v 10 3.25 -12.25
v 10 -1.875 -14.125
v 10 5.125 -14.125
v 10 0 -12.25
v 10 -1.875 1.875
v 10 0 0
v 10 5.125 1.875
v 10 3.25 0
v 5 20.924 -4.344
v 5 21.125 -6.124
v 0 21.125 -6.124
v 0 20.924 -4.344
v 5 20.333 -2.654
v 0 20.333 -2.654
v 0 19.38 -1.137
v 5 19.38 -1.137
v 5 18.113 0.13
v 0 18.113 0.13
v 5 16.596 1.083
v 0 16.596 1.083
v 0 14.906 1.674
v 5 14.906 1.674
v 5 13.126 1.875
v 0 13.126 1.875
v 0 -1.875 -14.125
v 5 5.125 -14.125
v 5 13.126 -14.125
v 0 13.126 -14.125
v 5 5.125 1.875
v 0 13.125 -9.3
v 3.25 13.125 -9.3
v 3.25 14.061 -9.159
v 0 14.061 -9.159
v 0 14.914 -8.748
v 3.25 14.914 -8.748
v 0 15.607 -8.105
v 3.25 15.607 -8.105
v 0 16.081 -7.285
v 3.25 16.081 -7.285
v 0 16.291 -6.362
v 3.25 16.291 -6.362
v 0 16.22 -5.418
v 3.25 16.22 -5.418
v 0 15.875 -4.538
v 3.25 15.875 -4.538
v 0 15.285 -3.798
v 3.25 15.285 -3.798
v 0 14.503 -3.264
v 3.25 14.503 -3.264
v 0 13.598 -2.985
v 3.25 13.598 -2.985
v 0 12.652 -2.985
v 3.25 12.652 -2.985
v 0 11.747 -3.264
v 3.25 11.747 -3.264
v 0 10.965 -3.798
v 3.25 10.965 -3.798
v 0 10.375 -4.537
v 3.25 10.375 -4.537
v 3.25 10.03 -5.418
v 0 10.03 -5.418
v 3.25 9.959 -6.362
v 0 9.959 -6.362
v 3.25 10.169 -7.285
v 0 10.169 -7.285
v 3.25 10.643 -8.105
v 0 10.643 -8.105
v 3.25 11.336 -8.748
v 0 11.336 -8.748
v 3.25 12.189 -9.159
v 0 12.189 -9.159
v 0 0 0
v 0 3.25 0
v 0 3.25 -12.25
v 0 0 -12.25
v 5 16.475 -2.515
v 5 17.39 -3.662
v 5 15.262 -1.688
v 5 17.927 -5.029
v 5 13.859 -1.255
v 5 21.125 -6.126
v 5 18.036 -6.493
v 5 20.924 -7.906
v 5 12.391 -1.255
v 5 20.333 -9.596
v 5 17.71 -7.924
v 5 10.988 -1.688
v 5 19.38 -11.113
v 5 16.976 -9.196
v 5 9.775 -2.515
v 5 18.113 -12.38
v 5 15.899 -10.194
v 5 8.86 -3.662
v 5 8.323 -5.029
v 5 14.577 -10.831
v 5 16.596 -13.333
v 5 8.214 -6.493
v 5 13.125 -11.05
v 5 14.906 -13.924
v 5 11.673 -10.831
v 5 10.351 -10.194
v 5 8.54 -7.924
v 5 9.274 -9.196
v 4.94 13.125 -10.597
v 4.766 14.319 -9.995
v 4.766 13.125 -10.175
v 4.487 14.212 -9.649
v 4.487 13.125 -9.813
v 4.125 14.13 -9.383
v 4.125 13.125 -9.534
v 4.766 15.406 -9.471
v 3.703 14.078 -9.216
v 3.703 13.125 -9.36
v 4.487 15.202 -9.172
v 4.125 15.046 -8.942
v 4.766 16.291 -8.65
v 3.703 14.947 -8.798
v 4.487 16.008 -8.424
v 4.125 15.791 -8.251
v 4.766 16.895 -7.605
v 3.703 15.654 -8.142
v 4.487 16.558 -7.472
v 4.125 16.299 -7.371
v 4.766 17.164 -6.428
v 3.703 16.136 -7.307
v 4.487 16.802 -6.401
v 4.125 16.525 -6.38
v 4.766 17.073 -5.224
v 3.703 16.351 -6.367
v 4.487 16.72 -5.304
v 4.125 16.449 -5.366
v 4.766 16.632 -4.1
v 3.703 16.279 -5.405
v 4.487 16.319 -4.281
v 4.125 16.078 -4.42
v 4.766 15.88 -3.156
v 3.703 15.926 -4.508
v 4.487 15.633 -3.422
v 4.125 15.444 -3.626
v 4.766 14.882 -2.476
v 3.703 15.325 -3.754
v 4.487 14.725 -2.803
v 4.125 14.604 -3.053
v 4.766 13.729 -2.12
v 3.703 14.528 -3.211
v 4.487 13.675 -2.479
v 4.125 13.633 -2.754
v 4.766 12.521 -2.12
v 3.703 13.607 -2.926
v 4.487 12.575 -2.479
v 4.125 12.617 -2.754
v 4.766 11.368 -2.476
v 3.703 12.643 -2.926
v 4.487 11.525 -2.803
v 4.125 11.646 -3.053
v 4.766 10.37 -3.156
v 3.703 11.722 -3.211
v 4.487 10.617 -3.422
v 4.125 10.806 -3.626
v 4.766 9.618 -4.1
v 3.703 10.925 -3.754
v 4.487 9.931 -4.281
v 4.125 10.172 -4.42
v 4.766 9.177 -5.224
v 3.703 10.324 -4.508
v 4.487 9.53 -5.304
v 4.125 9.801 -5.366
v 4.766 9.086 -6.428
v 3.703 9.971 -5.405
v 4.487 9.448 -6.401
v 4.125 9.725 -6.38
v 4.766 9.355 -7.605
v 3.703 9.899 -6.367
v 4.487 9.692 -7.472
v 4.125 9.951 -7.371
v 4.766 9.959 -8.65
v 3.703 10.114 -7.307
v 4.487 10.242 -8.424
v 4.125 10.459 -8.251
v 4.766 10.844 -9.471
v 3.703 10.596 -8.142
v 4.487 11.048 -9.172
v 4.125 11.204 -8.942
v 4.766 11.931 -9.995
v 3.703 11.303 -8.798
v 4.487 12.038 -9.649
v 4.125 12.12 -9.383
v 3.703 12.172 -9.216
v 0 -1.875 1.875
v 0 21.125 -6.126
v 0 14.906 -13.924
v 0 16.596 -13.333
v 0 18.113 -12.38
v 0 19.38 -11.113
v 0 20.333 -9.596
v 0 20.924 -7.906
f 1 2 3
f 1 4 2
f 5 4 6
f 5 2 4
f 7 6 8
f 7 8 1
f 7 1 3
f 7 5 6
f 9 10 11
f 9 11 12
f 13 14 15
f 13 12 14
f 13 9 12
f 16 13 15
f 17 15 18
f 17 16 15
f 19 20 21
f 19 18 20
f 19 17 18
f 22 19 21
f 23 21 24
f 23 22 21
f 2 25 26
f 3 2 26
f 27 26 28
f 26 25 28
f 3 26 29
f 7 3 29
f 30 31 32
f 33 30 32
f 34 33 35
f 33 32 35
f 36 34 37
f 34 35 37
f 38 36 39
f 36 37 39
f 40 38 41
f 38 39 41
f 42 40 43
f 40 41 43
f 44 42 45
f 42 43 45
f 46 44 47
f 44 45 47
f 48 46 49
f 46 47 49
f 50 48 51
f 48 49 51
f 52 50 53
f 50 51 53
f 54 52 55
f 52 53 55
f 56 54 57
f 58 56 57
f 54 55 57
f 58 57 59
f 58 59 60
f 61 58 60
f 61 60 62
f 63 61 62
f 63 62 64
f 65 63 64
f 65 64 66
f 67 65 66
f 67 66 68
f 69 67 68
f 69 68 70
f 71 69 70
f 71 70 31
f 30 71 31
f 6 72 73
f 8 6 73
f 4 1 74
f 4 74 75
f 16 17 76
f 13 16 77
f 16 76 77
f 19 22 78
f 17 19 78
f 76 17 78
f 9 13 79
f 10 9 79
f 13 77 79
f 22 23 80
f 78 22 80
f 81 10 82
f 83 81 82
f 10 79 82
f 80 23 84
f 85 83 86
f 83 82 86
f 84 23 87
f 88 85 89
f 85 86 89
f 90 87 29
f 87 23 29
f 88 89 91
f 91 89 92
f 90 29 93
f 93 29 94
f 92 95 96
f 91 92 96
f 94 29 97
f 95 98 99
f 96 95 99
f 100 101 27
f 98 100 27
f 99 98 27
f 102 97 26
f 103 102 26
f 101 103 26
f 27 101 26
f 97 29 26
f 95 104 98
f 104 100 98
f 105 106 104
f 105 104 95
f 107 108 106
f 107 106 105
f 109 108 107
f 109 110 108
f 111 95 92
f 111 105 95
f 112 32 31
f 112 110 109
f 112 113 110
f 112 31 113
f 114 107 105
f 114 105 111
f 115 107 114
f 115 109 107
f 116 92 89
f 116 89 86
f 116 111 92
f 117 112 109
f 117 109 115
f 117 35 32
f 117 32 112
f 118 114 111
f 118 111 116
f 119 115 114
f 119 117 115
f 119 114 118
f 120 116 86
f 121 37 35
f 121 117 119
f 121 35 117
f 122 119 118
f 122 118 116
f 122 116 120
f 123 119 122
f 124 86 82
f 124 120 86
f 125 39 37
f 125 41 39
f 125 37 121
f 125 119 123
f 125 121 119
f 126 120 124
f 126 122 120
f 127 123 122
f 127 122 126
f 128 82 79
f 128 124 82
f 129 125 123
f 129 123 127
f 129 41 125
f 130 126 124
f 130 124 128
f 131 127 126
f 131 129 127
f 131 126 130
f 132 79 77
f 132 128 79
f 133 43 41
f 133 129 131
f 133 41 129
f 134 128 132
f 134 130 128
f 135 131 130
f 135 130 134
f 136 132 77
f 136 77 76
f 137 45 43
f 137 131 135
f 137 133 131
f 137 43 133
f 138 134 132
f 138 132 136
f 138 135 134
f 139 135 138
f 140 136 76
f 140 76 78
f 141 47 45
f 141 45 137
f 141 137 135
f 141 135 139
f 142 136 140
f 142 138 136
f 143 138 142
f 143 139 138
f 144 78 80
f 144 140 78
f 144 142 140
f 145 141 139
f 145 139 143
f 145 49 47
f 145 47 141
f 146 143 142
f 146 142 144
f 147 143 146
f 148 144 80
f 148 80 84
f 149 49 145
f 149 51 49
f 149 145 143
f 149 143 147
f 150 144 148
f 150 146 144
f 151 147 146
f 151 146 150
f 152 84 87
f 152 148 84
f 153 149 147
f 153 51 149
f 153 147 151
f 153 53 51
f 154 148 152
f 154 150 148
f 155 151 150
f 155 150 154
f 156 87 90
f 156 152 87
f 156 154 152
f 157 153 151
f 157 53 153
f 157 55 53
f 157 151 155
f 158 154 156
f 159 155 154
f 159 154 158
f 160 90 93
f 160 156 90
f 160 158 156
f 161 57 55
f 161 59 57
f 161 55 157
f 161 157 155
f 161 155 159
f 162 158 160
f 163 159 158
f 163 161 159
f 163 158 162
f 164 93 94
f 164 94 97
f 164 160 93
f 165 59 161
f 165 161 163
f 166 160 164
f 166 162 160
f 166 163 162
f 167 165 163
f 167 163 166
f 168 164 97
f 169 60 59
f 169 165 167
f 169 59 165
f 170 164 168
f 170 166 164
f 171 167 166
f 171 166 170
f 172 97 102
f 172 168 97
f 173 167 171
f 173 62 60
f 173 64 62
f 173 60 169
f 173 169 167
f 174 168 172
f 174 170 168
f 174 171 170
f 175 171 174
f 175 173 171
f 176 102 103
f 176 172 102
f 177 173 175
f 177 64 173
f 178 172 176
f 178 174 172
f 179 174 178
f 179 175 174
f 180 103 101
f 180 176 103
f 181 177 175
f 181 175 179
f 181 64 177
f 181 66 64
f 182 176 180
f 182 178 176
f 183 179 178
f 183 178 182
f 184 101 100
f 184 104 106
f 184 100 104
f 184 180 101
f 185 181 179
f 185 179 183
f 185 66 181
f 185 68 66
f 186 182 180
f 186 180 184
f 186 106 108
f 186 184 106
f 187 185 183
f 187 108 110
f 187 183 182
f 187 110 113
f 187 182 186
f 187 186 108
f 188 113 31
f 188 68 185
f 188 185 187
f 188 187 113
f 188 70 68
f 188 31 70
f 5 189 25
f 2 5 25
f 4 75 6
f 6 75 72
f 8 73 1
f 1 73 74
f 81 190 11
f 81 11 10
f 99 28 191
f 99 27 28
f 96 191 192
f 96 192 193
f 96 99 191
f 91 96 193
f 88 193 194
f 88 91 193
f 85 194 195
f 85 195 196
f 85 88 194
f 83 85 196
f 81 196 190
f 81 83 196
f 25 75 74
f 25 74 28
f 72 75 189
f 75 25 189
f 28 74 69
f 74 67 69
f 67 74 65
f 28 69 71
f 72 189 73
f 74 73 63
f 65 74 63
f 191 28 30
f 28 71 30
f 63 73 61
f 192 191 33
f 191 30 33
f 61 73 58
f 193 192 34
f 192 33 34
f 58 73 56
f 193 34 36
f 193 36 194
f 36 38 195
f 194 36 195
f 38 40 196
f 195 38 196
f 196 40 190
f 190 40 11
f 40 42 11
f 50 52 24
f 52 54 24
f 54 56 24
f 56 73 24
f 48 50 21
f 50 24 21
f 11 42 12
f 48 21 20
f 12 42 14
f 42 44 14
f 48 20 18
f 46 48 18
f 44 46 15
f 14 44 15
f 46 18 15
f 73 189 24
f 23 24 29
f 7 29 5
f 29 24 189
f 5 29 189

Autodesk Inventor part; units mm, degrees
ref_plane "YZ Plane" through (0, 0, 0) normal (1, 0, 0) x (0, 1, 0)
ref_plane "XZ Plane" through (0, 0, 0) normal (0, 1, 0) x (-1, 0, 0)
ref_plane "XY Plane" through (0, 0, 0) normal (0, 0, 1) x (1, 0, 0)
sketch "Sketch1" plane through (0, 0, 0) normal (1, 0, 0) x (0, 1, 0)
  line L0 (0, 0) -> (3.25, 0)
  line L1 (3.25, 0) -> (3.25, -12.25)
  line L2 (3.25, -12.25) -> (0, -12.25)
  line L3 (0, -12.25) -> (0, 0)
  line L4 (-1.875, -14.125) -> (5.125, -14.125)
  line L5 (5.125, -14.125) -> (5.125, 1.875)
  line L6 (5.125, 1.875) -> (-1.875, 1.875)
  line L7 (-1.875, 1.875) -> (-1.875, -14.125)
  line L8 (-1.875, -14.125) -> (5.125, 1.875) construction
  line L9 (5.125, -14.125) -> (-1.875, 1.875) construction
  point P0 (1.625, -6.125)
  dimension "d0" = 3.25
  dimension "d1" = 12.25
  dimension "d2" = 7
  dimension "d3" = 16
extrude "Extrusion1" add sketch "Sketch1" along normal blind 10
sketch "Sketch2" plane through (0, 5.125, 1.875) normal (0, 1, 0) x (1, 0, 0)
  line L0 (0, 0) -> (0, 16) projected
  line L1 (0, 16) -> (10, 16) projected
  line L2 (0, 0) -> (5, 0)
  line L3 (5, 0) -> (5, 16)
  line L4 (5, 16) -> (0, 16)
  line L5 (0, 16) -> (0, 0)
  point P0 (0, 1.875)
  dimension "d6" = 5
extrude "Extrusion2" add sketch "Sketch2" along normal blind 16
sketch "Sketch3" plane through (5, 5.125, 1.875) normal (1, 0, 0) x (0, 0, -1)
  line L0 (16, 0) -> (0, 0) construction
  line L1 (0, -7) -> (0, 16) construction
  line L2 (16, 0) -> (0, 16) construction
  circle A0 centre (8, 8) radius 3.175
  point P0 (1.875, -5.125)
  dimension "d9" = 6.35
extrude "Extrusion3" cut sketch "Sketch3" against normal blind 16
fillet "Fillet1" radius 8 2 edges at (2.5, 21.125, 1.875) (2.5, 21.125, -14.125)
fillet "Fillet2" radius 1.75 1 edges at (5, 13.125, -2.95)
properties part number "frameAdjustment 11-28"
